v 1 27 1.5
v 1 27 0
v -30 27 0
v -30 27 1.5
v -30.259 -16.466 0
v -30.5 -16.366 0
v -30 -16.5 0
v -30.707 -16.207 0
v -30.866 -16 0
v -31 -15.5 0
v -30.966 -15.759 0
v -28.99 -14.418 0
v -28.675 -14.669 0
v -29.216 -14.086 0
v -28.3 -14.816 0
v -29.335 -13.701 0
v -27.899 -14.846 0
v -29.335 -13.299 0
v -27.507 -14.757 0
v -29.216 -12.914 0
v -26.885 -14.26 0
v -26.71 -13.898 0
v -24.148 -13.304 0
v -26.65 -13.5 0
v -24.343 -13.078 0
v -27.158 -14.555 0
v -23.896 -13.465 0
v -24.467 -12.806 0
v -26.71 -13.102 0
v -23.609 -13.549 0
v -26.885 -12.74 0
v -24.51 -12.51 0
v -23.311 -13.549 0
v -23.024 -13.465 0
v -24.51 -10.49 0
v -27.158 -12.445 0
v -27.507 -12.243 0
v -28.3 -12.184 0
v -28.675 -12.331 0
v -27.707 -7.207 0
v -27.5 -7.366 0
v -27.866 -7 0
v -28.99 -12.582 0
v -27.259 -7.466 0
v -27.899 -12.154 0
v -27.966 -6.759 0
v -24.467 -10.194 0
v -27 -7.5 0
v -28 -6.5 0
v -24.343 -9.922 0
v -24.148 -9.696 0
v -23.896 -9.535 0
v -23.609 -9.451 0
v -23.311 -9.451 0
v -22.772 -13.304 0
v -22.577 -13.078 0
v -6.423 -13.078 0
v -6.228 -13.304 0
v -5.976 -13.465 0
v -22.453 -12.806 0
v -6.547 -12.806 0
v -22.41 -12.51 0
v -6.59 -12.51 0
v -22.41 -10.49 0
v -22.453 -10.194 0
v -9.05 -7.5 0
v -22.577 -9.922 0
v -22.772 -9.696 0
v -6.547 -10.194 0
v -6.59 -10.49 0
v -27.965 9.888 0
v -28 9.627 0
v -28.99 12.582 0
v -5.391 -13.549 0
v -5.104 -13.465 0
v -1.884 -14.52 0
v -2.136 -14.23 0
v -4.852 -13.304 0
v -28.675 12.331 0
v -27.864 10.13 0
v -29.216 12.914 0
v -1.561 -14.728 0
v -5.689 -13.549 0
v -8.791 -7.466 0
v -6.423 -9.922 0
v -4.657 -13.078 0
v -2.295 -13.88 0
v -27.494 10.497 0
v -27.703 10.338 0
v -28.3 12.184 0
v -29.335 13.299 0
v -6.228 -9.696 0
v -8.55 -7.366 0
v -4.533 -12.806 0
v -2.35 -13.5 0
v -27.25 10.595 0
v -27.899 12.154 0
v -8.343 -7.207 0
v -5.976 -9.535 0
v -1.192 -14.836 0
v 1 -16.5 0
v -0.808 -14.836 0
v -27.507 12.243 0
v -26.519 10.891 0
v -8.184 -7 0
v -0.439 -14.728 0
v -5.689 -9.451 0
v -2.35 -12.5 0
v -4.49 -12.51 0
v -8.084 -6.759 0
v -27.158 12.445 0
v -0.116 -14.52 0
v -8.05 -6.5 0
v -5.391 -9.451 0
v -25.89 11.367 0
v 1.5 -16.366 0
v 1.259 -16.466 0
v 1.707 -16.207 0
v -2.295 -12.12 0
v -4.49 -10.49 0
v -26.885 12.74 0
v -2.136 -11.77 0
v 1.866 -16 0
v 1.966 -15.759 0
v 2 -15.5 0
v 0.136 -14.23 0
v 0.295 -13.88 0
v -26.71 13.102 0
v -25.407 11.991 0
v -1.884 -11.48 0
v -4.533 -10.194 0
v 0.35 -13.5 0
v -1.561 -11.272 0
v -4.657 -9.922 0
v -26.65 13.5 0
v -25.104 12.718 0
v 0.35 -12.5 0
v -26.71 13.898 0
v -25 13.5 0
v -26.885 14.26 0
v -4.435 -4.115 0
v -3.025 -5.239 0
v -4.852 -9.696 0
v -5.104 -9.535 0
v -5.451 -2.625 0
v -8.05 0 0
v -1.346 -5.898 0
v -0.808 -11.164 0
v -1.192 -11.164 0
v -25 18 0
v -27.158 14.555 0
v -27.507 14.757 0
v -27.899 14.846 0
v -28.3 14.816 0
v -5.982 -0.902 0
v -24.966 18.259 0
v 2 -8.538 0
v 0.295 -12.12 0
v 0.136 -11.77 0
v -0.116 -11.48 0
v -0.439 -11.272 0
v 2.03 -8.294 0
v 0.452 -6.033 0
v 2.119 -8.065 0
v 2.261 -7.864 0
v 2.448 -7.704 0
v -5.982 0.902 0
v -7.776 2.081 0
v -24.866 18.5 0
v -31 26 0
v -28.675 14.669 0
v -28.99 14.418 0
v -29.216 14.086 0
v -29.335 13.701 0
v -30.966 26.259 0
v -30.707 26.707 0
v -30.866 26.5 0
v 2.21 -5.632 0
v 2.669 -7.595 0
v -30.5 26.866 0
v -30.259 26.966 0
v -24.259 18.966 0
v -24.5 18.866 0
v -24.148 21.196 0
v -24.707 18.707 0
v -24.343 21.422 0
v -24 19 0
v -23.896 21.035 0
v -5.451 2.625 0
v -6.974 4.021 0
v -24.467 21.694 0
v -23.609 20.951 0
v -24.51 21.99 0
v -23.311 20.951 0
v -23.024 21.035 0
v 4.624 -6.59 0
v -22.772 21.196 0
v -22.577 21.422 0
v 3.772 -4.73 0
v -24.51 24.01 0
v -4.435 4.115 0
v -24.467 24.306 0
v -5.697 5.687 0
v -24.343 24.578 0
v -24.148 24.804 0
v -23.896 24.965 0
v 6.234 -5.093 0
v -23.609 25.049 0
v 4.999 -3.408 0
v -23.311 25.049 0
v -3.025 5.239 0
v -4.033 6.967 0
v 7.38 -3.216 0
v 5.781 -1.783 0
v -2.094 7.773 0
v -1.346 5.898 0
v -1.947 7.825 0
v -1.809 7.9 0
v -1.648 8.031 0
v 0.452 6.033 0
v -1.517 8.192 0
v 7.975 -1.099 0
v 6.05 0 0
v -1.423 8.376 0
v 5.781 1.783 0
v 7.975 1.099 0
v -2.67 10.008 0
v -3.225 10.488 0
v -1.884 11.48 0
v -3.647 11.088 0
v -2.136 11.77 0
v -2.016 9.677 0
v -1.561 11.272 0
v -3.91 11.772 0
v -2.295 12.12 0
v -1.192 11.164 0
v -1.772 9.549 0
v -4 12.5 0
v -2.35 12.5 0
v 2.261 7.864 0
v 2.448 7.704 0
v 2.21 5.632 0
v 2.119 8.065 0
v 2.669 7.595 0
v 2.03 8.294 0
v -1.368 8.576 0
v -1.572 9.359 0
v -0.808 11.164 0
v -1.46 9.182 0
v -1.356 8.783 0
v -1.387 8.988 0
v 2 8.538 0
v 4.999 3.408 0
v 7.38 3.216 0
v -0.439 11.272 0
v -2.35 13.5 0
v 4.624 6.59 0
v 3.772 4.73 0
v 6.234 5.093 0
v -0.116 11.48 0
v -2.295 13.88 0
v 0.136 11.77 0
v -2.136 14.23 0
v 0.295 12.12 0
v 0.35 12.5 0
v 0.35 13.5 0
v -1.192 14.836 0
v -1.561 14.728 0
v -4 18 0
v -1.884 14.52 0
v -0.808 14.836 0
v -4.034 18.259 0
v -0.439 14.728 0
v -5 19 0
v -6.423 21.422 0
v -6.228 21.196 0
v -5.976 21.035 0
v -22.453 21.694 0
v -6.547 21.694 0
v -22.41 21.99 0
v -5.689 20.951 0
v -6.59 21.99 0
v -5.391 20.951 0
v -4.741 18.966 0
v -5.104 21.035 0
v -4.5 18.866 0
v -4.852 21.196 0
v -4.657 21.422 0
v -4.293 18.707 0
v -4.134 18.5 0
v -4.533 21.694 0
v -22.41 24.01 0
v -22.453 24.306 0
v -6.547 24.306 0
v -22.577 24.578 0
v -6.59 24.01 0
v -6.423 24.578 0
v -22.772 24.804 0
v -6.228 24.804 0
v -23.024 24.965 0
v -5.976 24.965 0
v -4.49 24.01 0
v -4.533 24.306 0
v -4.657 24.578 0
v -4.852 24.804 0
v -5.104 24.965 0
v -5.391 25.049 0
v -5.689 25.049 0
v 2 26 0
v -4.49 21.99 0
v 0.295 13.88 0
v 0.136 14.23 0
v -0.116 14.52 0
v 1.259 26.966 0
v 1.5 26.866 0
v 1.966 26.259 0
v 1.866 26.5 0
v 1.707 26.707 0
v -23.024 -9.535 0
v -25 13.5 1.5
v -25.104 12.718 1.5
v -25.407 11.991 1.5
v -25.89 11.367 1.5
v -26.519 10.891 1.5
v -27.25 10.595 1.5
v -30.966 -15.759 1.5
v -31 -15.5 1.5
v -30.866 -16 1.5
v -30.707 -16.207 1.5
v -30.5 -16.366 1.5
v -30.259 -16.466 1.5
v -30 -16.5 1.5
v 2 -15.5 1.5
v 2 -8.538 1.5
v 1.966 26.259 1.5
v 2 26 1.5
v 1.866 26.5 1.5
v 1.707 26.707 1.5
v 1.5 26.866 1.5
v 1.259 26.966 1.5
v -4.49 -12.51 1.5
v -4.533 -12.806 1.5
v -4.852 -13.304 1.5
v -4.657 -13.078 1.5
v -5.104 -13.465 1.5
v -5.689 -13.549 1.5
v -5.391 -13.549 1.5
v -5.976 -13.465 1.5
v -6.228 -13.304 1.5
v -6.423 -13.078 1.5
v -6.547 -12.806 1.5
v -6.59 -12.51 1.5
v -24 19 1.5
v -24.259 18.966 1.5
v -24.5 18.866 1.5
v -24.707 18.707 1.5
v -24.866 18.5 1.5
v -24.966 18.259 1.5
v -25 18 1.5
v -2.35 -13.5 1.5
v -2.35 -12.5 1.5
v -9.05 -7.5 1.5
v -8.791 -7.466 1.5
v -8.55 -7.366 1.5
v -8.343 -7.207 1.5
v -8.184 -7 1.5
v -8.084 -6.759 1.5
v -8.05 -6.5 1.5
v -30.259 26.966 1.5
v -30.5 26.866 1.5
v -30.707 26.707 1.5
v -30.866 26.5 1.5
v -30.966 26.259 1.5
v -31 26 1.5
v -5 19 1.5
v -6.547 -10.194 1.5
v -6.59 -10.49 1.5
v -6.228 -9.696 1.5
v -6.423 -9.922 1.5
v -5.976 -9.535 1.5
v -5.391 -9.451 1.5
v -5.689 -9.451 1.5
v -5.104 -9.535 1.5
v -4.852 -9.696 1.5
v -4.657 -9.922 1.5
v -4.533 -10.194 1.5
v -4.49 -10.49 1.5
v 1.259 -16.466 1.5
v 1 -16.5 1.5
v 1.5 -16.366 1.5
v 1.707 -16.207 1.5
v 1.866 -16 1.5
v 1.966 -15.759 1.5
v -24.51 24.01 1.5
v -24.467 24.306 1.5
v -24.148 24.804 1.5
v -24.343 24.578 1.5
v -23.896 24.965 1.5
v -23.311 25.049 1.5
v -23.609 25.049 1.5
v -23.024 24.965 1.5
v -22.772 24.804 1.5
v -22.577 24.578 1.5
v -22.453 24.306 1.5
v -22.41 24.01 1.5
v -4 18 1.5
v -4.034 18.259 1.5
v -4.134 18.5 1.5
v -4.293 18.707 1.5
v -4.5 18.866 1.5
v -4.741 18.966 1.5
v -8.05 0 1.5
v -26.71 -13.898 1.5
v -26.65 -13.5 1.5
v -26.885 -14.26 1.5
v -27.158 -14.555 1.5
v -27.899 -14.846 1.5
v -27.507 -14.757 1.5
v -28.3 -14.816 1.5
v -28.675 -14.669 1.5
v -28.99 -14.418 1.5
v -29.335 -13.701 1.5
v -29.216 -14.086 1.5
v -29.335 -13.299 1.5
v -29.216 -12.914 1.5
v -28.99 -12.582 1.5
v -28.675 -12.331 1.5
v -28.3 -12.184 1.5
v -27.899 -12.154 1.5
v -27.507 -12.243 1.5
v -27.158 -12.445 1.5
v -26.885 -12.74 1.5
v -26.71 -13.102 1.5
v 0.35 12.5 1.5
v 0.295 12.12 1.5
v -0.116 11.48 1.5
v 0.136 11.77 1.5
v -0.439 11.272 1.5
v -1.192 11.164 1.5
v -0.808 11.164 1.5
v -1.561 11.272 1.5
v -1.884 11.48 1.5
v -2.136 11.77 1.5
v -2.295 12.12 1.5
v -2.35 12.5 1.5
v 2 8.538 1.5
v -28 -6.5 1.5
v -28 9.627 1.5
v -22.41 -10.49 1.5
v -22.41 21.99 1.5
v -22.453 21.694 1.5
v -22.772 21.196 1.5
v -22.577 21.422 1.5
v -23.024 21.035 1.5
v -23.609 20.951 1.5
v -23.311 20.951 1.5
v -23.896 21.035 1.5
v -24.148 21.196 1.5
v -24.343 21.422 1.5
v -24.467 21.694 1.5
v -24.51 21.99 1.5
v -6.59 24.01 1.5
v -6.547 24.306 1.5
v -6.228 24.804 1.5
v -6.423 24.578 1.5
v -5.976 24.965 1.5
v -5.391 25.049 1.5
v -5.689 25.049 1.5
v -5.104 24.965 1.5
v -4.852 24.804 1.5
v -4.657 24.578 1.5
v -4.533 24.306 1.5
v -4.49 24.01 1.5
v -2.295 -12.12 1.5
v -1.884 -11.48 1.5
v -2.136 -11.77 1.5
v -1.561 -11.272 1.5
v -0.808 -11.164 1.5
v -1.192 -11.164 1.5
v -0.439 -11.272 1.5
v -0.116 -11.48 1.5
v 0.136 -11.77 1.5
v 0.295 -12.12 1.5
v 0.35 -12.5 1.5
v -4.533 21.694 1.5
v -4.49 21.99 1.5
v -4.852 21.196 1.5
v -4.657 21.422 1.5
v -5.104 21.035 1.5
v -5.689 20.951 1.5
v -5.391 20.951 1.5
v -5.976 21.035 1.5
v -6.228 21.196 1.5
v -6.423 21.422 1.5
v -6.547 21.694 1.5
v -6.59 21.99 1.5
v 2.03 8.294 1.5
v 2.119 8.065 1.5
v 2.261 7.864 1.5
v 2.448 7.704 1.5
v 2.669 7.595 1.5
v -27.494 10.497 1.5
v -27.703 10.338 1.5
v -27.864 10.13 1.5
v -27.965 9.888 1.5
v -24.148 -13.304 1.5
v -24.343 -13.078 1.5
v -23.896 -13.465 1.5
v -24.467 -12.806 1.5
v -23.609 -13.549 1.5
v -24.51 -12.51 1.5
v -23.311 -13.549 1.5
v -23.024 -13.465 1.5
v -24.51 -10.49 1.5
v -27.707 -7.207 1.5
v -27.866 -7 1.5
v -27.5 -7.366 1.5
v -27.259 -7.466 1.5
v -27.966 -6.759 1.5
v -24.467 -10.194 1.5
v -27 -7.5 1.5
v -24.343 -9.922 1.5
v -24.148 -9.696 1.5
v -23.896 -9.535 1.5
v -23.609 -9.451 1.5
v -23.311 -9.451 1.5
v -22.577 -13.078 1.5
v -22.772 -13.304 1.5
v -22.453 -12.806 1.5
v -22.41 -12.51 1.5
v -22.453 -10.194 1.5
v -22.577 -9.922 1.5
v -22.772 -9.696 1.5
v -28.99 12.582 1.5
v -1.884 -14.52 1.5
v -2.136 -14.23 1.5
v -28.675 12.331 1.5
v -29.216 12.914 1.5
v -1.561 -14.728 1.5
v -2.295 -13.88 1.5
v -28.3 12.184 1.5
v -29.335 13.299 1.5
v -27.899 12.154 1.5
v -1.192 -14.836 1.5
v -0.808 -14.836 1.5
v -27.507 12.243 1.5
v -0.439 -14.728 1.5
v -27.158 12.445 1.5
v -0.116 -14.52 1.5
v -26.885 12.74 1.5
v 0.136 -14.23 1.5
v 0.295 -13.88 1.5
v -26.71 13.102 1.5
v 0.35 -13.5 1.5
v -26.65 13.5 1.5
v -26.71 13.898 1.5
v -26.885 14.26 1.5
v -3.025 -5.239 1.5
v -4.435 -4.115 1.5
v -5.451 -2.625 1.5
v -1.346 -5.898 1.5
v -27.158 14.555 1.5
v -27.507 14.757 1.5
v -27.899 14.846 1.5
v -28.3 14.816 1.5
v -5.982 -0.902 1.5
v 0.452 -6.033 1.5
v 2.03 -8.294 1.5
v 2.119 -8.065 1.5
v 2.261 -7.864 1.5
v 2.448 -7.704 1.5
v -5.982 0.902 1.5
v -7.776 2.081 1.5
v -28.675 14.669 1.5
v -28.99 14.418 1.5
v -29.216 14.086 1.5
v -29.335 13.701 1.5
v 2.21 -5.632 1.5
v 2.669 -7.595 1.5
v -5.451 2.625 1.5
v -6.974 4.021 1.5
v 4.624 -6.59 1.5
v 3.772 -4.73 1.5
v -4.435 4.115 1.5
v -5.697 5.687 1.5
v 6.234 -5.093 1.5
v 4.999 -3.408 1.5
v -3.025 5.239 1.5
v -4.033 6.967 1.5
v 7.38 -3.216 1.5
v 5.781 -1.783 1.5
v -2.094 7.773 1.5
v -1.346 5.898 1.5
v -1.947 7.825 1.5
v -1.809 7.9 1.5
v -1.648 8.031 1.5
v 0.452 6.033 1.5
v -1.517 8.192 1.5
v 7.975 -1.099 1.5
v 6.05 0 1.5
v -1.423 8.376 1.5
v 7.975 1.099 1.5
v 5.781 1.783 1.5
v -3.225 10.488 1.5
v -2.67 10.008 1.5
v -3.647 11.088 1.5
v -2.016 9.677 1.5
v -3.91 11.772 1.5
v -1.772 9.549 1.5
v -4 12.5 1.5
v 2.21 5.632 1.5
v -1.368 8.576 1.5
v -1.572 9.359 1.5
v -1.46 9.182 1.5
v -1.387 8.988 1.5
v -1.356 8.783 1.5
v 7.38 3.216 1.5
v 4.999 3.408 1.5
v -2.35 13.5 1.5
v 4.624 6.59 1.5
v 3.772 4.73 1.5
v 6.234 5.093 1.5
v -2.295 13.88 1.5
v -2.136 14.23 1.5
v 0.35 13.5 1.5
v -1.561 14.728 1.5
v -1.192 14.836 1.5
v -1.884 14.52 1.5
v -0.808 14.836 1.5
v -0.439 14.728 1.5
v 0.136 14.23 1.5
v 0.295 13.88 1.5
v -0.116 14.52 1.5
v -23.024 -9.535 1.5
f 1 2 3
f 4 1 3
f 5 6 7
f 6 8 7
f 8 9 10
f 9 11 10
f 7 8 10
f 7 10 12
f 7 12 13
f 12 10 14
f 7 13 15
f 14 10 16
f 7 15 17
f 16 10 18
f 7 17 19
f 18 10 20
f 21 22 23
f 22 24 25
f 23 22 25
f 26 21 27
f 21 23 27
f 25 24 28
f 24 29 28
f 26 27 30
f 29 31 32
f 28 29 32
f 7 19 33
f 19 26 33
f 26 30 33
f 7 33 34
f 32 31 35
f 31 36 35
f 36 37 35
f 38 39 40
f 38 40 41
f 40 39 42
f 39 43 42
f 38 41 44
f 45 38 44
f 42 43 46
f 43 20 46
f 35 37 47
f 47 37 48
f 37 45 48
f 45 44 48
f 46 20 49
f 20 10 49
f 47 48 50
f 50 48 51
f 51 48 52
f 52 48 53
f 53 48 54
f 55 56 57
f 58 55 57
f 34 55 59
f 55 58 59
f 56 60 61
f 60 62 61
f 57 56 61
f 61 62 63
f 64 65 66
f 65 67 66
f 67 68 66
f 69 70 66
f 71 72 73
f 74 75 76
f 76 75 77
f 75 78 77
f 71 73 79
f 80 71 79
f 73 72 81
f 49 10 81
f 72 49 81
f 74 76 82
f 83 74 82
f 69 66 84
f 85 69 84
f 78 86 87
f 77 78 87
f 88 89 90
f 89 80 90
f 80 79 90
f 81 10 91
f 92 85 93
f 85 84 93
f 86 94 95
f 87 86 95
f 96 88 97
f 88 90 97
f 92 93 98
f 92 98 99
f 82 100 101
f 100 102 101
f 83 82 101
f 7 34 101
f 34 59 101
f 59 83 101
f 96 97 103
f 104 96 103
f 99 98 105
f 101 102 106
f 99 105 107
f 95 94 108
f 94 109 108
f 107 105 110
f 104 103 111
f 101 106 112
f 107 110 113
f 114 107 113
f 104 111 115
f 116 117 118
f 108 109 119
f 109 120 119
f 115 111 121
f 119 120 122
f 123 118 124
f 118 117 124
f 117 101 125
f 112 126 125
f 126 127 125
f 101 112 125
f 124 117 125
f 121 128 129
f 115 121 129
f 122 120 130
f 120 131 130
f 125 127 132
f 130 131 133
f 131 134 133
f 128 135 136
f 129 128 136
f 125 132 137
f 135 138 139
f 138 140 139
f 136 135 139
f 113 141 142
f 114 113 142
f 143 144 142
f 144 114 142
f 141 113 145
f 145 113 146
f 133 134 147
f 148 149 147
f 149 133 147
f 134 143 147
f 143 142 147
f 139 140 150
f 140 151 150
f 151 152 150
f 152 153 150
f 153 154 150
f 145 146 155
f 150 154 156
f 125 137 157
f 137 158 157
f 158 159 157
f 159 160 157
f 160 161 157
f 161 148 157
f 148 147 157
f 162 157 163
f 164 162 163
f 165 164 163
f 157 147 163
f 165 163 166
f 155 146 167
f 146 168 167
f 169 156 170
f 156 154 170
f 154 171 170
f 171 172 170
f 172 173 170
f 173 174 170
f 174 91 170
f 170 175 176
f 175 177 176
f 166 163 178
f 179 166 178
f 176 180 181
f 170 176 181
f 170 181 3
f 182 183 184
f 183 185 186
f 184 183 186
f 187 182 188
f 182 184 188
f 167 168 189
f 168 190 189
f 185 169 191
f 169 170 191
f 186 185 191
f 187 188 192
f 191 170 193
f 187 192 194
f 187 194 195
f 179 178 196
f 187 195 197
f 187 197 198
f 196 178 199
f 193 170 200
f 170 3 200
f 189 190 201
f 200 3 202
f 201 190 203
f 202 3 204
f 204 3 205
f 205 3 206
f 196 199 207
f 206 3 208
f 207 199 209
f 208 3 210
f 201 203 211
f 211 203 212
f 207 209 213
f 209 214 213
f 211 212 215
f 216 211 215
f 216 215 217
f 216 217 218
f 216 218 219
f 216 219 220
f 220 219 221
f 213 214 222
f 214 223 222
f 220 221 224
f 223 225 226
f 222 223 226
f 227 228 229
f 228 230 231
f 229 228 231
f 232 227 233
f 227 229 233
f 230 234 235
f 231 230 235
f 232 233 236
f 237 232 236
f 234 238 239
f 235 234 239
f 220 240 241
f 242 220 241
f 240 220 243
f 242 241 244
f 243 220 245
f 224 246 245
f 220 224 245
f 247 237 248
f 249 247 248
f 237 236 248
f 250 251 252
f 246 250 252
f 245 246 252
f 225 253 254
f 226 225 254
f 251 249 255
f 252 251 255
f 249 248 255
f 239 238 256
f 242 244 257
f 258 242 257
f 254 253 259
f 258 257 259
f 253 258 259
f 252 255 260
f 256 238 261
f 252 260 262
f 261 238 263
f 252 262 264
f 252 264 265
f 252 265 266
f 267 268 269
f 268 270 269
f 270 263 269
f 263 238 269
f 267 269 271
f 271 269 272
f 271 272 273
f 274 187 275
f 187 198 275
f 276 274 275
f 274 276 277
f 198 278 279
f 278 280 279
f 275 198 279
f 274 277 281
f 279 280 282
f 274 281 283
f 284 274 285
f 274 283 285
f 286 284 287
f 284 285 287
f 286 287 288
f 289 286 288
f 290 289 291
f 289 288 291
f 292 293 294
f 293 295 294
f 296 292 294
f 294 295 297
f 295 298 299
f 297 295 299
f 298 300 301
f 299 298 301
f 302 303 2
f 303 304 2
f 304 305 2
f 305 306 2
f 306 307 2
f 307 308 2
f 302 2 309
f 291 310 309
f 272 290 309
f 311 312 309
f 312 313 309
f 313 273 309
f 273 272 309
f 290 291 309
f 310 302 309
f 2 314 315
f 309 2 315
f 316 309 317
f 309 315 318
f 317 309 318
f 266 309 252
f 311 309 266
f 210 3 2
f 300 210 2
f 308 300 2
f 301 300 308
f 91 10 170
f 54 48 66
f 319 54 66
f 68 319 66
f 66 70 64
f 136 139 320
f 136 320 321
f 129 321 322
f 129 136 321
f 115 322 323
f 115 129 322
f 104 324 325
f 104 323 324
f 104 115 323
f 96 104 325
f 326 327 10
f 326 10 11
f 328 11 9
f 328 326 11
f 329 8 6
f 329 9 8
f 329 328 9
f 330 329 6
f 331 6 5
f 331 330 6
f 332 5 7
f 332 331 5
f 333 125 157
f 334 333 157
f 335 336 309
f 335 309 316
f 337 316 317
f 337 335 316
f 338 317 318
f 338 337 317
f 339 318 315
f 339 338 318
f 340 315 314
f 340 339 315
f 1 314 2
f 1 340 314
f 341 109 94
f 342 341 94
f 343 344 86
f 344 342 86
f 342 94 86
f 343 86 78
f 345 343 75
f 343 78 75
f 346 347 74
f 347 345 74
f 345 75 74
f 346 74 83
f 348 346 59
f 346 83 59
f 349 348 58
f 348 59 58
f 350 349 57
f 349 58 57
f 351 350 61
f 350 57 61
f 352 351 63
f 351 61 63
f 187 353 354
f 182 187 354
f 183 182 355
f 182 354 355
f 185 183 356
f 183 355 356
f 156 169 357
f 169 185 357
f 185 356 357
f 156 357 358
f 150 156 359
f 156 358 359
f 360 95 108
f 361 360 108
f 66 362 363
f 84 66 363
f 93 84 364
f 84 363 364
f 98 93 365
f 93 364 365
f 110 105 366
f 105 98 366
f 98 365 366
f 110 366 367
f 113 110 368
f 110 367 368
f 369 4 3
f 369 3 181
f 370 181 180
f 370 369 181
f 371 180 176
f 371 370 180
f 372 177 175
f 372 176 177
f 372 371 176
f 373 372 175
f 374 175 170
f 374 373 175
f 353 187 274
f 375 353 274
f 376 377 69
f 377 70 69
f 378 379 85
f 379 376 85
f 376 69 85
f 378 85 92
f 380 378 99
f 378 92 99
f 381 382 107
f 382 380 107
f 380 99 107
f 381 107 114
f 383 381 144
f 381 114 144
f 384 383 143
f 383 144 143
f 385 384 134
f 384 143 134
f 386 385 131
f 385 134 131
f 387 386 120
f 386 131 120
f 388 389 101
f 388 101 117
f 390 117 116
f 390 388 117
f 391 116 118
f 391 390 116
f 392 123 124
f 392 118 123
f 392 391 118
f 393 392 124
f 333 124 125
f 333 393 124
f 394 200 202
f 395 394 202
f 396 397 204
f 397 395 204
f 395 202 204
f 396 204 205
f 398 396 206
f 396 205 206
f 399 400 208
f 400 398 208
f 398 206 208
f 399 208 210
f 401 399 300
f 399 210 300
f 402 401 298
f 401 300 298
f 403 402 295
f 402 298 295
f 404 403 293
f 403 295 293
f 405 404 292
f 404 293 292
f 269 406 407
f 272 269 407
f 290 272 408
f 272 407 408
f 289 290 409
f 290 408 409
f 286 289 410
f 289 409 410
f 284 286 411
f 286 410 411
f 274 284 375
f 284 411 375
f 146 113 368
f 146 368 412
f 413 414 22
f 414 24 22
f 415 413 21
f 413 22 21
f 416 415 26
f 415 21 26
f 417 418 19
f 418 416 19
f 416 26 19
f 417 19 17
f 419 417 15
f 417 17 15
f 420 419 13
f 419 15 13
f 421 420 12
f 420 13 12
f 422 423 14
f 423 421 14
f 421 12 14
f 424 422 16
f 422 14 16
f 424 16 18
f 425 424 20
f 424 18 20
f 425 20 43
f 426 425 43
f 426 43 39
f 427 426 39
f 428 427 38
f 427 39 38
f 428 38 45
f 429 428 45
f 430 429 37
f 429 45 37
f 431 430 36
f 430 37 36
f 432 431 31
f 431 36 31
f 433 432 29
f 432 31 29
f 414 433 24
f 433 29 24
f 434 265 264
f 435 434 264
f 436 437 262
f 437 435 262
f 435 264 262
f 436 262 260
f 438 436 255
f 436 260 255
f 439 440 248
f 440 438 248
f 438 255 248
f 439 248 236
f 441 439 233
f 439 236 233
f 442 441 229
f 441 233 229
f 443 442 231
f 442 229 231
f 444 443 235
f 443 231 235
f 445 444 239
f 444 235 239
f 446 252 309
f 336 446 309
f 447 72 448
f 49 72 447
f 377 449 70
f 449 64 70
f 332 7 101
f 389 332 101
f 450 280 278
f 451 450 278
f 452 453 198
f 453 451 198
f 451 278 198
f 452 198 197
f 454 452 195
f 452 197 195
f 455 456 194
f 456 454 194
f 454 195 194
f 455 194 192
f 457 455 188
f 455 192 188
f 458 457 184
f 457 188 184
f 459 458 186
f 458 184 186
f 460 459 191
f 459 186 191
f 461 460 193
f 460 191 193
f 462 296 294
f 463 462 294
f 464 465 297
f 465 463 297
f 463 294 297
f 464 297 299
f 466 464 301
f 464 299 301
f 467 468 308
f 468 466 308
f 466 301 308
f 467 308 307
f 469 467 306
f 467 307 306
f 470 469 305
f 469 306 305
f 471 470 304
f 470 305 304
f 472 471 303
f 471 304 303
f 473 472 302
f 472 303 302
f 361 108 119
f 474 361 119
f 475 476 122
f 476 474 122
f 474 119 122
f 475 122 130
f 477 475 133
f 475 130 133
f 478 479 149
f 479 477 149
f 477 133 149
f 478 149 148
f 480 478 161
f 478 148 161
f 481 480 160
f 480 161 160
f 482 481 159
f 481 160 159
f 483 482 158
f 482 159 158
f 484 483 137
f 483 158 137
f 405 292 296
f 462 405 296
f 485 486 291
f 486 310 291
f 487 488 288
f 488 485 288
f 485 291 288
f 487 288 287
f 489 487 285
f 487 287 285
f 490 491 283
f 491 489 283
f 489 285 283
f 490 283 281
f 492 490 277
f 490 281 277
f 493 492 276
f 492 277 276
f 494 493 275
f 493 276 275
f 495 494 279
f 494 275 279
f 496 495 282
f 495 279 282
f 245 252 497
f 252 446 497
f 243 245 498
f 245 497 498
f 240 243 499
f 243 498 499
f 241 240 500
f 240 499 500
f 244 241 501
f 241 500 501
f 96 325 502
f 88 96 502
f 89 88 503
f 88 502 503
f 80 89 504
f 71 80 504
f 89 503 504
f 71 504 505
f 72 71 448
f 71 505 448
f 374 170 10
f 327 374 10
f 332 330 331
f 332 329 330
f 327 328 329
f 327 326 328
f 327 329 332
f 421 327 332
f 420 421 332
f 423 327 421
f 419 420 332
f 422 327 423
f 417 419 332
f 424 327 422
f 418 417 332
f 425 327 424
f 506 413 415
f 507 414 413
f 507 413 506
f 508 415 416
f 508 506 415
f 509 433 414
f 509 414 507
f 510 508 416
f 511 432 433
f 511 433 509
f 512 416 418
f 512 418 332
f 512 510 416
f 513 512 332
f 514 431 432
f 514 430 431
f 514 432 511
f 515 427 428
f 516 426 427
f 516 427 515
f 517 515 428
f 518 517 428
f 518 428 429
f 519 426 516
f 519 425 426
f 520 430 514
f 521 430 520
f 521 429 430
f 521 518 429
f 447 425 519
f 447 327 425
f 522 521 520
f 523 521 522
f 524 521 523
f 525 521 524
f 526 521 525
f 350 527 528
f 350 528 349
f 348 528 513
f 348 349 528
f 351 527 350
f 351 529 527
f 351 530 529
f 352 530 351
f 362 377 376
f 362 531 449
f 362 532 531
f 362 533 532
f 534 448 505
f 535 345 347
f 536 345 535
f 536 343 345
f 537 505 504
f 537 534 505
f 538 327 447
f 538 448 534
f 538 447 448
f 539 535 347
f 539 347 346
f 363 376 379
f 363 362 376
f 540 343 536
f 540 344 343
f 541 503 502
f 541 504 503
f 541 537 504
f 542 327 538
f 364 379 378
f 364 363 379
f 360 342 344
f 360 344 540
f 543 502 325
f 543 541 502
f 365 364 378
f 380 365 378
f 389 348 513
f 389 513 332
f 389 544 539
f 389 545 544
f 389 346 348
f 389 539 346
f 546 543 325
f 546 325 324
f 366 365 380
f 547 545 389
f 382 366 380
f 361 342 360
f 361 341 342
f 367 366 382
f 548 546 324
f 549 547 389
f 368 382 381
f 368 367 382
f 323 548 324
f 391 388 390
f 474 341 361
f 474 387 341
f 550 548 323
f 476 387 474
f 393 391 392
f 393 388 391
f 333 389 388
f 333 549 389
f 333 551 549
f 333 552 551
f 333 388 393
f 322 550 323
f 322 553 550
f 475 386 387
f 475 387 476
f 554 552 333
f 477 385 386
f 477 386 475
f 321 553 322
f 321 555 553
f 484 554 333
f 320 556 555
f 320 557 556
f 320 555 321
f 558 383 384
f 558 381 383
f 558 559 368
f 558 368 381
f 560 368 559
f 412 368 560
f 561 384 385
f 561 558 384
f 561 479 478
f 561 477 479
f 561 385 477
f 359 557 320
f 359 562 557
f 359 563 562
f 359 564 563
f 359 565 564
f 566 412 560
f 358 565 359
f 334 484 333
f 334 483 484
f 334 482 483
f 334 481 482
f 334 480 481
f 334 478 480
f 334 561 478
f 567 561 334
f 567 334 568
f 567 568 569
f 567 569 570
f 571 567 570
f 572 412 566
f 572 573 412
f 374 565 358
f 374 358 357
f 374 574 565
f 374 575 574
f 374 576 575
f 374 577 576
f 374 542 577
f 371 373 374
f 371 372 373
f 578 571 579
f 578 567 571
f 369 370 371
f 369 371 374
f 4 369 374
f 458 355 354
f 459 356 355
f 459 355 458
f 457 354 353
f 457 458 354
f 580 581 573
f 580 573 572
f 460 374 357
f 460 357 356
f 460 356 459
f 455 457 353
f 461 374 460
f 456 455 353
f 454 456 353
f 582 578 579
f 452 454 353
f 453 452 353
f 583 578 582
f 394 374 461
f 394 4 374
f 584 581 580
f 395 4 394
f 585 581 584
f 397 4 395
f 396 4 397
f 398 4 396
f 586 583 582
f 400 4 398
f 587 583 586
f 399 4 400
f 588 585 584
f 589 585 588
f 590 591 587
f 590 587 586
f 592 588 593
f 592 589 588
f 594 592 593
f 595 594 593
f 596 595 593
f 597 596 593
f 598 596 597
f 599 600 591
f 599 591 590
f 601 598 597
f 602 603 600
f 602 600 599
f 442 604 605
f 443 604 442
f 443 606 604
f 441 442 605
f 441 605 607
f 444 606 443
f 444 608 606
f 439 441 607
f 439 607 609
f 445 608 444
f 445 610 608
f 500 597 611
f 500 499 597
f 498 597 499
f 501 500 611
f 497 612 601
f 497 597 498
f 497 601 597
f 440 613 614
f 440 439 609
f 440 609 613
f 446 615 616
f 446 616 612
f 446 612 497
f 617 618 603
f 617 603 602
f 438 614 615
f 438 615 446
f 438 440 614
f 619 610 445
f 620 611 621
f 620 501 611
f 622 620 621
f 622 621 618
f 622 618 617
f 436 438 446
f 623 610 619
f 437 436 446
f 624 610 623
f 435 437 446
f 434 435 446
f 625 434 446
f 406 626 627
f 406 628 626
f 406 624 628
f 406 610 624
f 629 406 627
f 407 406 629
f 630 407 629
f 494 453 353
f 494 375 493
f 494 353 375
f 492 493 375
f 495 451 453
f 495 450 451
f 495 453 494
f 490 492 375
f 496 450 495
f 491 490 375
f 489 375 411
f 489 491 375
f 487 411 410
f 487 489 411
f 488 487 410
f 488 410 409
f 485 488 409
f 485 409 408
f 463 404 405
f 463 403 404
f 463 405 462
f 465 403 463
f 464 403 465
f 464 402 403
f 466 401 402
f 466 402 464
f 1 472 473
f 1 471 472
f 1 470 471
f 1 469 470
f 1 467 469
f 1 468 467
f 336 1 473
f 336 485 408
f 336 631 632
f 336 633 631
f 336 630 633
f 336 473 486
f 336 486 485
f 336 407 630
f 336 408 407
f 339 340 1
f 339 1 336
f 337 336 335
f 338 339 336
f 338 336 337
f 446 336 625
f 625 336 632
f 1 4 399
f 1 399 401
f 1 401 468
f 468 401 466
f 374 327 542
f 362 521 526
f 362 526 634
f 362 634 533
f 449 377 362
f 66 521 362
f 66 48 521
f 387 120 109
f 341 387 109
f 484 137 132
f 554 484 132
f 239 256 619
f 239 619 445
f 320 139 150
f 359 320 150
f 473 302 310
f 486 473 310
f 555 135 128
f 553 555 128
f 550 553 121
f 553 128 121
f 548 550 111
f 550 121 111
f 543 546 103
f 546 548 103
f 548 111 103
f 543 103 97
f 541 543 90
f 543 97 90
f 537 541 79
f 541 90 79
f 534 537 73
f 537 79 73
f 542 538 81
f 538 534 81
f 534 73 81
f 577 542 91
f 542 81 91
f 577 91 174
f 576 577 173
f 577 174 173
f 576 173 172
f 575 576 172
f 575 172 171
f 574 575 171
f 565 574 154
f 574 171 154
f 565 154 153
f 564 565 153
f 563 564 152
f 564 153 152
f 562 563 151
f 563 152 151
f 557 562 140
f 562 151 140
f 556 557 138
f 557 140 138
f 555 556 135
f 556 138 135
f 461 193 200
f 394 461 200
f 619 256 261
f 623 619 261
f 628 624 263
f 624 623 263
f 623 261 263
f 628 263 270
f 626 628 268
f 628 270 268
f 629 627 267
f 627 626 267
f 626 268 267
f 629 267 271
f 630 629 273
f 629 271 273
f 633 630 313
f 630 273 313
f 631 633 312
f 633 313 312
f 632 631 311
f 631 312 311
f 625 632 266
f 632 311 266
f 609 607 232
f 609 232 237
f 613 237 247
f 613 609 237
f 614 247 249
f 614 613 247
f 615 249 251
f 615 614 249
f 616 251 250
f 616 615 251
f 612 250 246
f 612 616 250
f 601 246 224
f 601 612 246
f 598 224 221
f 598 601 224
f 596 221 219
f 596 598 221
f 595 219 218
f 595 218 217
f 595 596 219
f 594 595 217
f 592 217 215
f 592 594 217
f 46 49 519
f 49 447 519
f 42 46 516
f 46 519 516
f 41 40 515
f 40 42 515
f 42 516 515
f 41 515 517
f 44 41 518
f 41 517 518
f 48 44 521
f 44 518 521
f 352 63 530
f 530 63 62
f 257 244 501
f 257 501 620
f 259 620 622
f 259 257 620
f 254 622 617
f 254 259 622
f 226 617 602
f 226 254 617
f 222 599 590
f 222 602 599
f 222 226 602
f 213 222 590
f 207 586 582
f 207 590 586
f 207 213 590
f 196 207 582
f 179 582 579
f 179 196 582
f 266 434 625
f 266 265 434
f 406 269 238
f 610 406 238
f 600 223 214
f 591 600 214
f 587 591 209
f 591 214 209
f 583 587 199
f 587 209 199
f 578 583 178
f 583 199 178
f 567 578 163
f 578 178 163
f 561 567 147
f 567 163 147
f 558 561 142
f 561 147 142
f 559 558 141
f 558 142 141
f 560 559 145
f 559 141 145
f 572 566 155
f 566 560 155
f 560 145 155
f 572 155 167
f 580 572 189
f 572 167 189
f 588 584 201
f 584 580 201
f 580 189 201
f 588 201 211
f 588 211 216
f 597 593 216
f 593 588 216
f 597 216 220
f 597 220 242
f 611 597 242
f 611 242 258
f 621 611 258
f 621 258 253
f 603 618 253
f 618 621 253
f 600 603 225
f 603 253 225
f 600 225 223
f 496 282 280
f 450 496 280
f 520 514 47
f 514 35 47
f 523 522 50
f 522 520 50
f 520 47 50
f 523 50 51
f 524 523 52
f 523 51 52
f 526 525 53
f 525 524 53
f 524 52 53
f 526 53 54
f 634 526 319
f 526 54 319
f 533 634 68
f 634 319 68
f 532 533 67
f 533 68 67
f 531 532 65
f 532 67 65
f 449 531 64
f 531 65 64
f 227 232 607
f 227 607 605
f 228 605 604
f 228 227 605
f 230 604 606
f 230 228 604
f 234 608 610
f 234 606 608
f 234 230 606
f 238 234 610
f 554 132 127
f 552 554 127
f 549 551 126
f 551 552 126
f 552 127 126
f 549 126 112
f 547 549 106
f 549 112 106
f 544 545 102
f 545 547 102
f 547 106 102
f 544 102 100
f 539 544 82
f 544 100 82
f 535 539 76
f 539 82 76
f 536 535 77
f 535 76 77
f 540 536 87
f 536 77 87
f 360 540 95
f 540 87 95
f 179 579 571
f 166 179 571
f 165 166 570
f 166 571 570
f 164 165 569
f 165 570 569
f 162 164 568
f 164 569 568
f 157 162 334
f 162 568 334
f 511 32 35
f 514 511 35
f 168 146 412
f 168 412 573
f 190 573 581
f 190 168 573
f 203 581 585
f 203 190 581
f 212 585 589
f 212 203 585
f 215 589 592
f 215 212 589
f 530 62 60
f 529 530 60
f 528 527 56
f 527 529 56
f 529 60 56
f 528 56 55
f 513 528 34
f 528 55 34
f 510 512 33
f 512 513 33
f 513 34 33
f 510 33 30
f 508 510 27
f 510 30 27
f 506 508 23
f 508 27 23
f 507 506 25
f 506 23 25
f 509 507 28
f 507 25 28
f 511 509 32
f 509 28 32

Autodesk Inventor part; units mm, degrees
ref_plane "YZ Plane" through (0, 0, 0) normal (1, 0, 0) x (0, 1, 0)
ref_plane "XZ Plane" through (0, 0, 0) normal (0, 1, 0) x (-1, 0, 0)
ref_plane "XY Plane" through (0, 0, 0) normal (0, 0, 1) x (1, 0, 0)
sketch "スケッチ1" plane through (0, 0, 0) normal (0, 0, 1) x (1, 0, 0)
  circle A0 centre (0, 0) radius 6.05
  arc A1 (2, -7.7976) -> (2, 7.7976) centre (0, 0) ccw
  line L0 (-31, 0) -> (0, 0) construction
  line L1 (-24.51, 24.01) -> (-4.49, 24.01)
  line L2 (-4.49, 24.01) -> (-4.49, 21.99)
  line L3 (-4.49, 21.99) -> (-24.51, 21.99)
  line L4 (-24.51, 21.99) -> (-24.51, 24.01)
  line L5 (-24.51, 24.01) -> (-4.49, 21.99) construction
  line L6 (-4.49, 24.01) -> (-24.51, 21.99) construction
  line L7 (-24.5, 24) -> (-4.5, 24) construction
  line L8 (-4.5, 24) -> (-4.5, 22) construction
  line L9 (-4.5, 22) -> (-24.5, 22) construction
  line L10 (-24.5, 22) -> (-24.5, 24) construction
  line L11 (-24.5, 24) -> (-4.5, 22) construction
  line L12 (-4.5, 24) -> (-24.5, 22) construction
  line L13 (-24.51, 23) -> (-4.49, 23) construction
  arc A2 (-22.41, 24.01) -> (-24.51, 24.01) centre (-23.46, 24.01) ccw
  arc A3 (-24.51, 21.99) -> (-22.41, 21.99) centre (-23.46, 21.99) ccw
  line L14 (-14.5, 24) -> (-14.5, 21.99) construction
  arc A4 (-4.49, 24.01) -> (-6.59, 24.01) centre (-5.54, 24.01) ccw
  arc A5 (-6.59, 21.99) -> (-4.49, 21.99) centre (-5.54, 21.99) ccw
  line L15 (-28, 13.5) -> (-1, 13.5) construction
  line L16 (-1, 13.5) -> (-1, -13.5) construction
  line L17 (-1, -13.5) -> (-28, -13.5) construction
  line L18 (-28, -13.5) -> (-28, 13.5) construction
  line L19 (-28, 13.5) -> (-1, -13.5) construction
  line L20 (-1, 13.5) -> (-28, -13.5) construction
  line L21 (-14.5, 13.5) -> (-14.5, -13.5) construction
  line L22 (-24.51, -10.49) -> (-4.49, -10.49)
  line L23 (-4.49, -10.49) -> (-4.49, -12.51)
  line L24 (-4.49, -12.51) -> (-24.51, -12.51)
  line L25 (-24.51, -12.51) -> (-24.51, -10.49)
  line L26 (-24.51, -10.49) -> (-4.49, -12.51) construction
  line L27 (-4.49, -10.49) -> (-24.51, -12.51) construction
  line L28 (-24.5, -10.5) -> (-4.5, -10.5) construction
  line L29 (-4.5, -10.5) -> (-4.5, -12.5) construction
  line L30 (-4.5, -12.5) -> (-24.5, -12.5) construction
  line L31 (-24.5, -12.5) -> (-24.5, -10.5) construction
  line L32 (-24.5, -10.5) -> (-4.5, -12.5) construction
  line L33 (-4.5, -10.5) -> (-24.5, -12.5) construction
  line L34 (-24.51, -11.5) -> (-4.49, -11.5) construction
  arc A6 (-22.41, -10.49) -> (-24.51, -10.49) centre (-23.46, -10.49) ccw
  arc A7 (-24.51, -12.51) -> (-22.41, -12.51) centre (-23.46, -12.51) ccw
  line L35 (-14.5, -10.5) -> (-14.5, -12.51) construction
  arc A8 (-4.49, -10.49) -> (-6.59, -10.49) centre (-5.54, -10.49) ccw
  arc A9 (-6.59, -12.51) -> (-4.49, -12.51) centre (-5.54, -12.51) ccw
  line L36 (-31, 27) -> (-31, -16.5)
  line L37 (-31, -16.5) -> (2, -16.5)
  line L38 (2, -16.5) -> (2, -7.7976)
  line L39 (2, 7.7976) -> (2, 27)
  line L40 (2, 27) -> (-31, 27)
  arc A10 (-28, 10.5) -> (-25, 13.5) centre (-28, 13.5) ccw
  line L41 (-28, 10.5) -> (-28, 10.5)
  line L42 (-28, 10.5) -> (-28, -7.5)
  line L43 (-28, -7.5) -> (-8.05, -7.5)
  line L44 (-8.05, -7.5) -> (-8.05, 0)
  line L45 (-25, 13.5) -> (-25, 19)
  line L46 (-25, 19) -> (-4, 19)
  arc A11 (-1, 7.9876) -> (-8.05, 0) centre (0, 0) ccw
  line L47 (-1, 9.5) -> (-1, 7.9876)
  circle A12 centre (-28, 13.5) radius 1.35
  arc A13 (0.35, 13.5) -> (-2.35, 13.5) centre (-1, 13.5) ccw
  arc A14 (-2.35, 12.5) -> (0.35, 12.5) centre (-1, 12.5) ccw
  arc A15 (-4, 12.5) -> (-1, 9.5) centre (-1, 12.5) ccw
  line L48 (0.35, 12.5) -> (0.35, 13.5)
  line L49 (-2.35, 13.5) -> (-2.35, 12.5)
  line L50 (-4, 19) -> (-4, 12.5)
  arc A16 (-2.35, -13.5) -> (0.35, -13.5) centre (-1, -13.5) ccw
  arc A17 (0.35, -12.5) -> (-2.35, -12.5) centre (-1, -12.5) ccw
  line L51 (0.35, -12.5) -> (0.35, -13.5)
  line L52 (-2.35, -13.5) -> (-2.35, -12.5)
  circle A18 centre (-28, -13.5) radius 1.35
  point P0 (-14.5, 23)
  point P1 (-14.5, 0)
  point P2 (-14.5, -11.5)
  point P3 (-14.5, 22.995)
  point P4 (-6.59, -10.49)
  point P5 (-6.59, -12.51)
  point P6 (-22.41, -12.51)
  point P7 (-6.59, 24.01)
  dimension "d96" = 12.1
  dimension "d215" = 20
  dimension "d216" = 2
  dimension "d217" = 0.01
  dimension "d219" = 0.01
  dimension "d220" = 1.05
  dimension "d222" = 27
  dimension "d223" = 27
  dimension "d226" = 20
  dimension "d227" = 2
  dimension "d228" = 0.01
  dimension "d229" = 0.01
  dimension "d230" = 1.05
  dimension "d231" = 32.5
  dimension "d238" = 3
  dimension "d240" = 3
  dimension "d241" = 3
  dimension "d242" = 4
  dimension "d243" = 3
  dimension "d244" = 2
  dimension "d245" = 3
  dimension "d246" = 3
  dimension "d247" = 3
  dimension "d248" = 3
  dimension "d251" = 2
  dimension "d252" = 3
  dimension "d255" = 1
  dimension "d257" = 2.7
  dimension "d259" = 2.7
  dimension "d260" = 1
  dimension "d262" = 3
extrude "押し出し1" add sketch "スケッチ1" along normal blind 1.5
fillet "フィレット1" radius 1 7 edges at (-1, 7.9876, 0.75) (-8.05, -7.5, 0.75) (-28, -7.5, 0.75) (-25, 19, 0.75) (-28, 10.5, 0.75) (-4, 19, 0.75) (-1, 9.5, 0.75)
fillet "フィレット2" radius 1 6 edges at (-31, 27, 0.75) (2, 27, 0.75) (-31, -16.5, 0.75) (2, -7.7976, 0.75) (2, -16.5, 0.75) (2, 7.7976, 0.75)
properties part number "Trunk_vertical_frame_06" material "アルミニウム 2014-T4"
